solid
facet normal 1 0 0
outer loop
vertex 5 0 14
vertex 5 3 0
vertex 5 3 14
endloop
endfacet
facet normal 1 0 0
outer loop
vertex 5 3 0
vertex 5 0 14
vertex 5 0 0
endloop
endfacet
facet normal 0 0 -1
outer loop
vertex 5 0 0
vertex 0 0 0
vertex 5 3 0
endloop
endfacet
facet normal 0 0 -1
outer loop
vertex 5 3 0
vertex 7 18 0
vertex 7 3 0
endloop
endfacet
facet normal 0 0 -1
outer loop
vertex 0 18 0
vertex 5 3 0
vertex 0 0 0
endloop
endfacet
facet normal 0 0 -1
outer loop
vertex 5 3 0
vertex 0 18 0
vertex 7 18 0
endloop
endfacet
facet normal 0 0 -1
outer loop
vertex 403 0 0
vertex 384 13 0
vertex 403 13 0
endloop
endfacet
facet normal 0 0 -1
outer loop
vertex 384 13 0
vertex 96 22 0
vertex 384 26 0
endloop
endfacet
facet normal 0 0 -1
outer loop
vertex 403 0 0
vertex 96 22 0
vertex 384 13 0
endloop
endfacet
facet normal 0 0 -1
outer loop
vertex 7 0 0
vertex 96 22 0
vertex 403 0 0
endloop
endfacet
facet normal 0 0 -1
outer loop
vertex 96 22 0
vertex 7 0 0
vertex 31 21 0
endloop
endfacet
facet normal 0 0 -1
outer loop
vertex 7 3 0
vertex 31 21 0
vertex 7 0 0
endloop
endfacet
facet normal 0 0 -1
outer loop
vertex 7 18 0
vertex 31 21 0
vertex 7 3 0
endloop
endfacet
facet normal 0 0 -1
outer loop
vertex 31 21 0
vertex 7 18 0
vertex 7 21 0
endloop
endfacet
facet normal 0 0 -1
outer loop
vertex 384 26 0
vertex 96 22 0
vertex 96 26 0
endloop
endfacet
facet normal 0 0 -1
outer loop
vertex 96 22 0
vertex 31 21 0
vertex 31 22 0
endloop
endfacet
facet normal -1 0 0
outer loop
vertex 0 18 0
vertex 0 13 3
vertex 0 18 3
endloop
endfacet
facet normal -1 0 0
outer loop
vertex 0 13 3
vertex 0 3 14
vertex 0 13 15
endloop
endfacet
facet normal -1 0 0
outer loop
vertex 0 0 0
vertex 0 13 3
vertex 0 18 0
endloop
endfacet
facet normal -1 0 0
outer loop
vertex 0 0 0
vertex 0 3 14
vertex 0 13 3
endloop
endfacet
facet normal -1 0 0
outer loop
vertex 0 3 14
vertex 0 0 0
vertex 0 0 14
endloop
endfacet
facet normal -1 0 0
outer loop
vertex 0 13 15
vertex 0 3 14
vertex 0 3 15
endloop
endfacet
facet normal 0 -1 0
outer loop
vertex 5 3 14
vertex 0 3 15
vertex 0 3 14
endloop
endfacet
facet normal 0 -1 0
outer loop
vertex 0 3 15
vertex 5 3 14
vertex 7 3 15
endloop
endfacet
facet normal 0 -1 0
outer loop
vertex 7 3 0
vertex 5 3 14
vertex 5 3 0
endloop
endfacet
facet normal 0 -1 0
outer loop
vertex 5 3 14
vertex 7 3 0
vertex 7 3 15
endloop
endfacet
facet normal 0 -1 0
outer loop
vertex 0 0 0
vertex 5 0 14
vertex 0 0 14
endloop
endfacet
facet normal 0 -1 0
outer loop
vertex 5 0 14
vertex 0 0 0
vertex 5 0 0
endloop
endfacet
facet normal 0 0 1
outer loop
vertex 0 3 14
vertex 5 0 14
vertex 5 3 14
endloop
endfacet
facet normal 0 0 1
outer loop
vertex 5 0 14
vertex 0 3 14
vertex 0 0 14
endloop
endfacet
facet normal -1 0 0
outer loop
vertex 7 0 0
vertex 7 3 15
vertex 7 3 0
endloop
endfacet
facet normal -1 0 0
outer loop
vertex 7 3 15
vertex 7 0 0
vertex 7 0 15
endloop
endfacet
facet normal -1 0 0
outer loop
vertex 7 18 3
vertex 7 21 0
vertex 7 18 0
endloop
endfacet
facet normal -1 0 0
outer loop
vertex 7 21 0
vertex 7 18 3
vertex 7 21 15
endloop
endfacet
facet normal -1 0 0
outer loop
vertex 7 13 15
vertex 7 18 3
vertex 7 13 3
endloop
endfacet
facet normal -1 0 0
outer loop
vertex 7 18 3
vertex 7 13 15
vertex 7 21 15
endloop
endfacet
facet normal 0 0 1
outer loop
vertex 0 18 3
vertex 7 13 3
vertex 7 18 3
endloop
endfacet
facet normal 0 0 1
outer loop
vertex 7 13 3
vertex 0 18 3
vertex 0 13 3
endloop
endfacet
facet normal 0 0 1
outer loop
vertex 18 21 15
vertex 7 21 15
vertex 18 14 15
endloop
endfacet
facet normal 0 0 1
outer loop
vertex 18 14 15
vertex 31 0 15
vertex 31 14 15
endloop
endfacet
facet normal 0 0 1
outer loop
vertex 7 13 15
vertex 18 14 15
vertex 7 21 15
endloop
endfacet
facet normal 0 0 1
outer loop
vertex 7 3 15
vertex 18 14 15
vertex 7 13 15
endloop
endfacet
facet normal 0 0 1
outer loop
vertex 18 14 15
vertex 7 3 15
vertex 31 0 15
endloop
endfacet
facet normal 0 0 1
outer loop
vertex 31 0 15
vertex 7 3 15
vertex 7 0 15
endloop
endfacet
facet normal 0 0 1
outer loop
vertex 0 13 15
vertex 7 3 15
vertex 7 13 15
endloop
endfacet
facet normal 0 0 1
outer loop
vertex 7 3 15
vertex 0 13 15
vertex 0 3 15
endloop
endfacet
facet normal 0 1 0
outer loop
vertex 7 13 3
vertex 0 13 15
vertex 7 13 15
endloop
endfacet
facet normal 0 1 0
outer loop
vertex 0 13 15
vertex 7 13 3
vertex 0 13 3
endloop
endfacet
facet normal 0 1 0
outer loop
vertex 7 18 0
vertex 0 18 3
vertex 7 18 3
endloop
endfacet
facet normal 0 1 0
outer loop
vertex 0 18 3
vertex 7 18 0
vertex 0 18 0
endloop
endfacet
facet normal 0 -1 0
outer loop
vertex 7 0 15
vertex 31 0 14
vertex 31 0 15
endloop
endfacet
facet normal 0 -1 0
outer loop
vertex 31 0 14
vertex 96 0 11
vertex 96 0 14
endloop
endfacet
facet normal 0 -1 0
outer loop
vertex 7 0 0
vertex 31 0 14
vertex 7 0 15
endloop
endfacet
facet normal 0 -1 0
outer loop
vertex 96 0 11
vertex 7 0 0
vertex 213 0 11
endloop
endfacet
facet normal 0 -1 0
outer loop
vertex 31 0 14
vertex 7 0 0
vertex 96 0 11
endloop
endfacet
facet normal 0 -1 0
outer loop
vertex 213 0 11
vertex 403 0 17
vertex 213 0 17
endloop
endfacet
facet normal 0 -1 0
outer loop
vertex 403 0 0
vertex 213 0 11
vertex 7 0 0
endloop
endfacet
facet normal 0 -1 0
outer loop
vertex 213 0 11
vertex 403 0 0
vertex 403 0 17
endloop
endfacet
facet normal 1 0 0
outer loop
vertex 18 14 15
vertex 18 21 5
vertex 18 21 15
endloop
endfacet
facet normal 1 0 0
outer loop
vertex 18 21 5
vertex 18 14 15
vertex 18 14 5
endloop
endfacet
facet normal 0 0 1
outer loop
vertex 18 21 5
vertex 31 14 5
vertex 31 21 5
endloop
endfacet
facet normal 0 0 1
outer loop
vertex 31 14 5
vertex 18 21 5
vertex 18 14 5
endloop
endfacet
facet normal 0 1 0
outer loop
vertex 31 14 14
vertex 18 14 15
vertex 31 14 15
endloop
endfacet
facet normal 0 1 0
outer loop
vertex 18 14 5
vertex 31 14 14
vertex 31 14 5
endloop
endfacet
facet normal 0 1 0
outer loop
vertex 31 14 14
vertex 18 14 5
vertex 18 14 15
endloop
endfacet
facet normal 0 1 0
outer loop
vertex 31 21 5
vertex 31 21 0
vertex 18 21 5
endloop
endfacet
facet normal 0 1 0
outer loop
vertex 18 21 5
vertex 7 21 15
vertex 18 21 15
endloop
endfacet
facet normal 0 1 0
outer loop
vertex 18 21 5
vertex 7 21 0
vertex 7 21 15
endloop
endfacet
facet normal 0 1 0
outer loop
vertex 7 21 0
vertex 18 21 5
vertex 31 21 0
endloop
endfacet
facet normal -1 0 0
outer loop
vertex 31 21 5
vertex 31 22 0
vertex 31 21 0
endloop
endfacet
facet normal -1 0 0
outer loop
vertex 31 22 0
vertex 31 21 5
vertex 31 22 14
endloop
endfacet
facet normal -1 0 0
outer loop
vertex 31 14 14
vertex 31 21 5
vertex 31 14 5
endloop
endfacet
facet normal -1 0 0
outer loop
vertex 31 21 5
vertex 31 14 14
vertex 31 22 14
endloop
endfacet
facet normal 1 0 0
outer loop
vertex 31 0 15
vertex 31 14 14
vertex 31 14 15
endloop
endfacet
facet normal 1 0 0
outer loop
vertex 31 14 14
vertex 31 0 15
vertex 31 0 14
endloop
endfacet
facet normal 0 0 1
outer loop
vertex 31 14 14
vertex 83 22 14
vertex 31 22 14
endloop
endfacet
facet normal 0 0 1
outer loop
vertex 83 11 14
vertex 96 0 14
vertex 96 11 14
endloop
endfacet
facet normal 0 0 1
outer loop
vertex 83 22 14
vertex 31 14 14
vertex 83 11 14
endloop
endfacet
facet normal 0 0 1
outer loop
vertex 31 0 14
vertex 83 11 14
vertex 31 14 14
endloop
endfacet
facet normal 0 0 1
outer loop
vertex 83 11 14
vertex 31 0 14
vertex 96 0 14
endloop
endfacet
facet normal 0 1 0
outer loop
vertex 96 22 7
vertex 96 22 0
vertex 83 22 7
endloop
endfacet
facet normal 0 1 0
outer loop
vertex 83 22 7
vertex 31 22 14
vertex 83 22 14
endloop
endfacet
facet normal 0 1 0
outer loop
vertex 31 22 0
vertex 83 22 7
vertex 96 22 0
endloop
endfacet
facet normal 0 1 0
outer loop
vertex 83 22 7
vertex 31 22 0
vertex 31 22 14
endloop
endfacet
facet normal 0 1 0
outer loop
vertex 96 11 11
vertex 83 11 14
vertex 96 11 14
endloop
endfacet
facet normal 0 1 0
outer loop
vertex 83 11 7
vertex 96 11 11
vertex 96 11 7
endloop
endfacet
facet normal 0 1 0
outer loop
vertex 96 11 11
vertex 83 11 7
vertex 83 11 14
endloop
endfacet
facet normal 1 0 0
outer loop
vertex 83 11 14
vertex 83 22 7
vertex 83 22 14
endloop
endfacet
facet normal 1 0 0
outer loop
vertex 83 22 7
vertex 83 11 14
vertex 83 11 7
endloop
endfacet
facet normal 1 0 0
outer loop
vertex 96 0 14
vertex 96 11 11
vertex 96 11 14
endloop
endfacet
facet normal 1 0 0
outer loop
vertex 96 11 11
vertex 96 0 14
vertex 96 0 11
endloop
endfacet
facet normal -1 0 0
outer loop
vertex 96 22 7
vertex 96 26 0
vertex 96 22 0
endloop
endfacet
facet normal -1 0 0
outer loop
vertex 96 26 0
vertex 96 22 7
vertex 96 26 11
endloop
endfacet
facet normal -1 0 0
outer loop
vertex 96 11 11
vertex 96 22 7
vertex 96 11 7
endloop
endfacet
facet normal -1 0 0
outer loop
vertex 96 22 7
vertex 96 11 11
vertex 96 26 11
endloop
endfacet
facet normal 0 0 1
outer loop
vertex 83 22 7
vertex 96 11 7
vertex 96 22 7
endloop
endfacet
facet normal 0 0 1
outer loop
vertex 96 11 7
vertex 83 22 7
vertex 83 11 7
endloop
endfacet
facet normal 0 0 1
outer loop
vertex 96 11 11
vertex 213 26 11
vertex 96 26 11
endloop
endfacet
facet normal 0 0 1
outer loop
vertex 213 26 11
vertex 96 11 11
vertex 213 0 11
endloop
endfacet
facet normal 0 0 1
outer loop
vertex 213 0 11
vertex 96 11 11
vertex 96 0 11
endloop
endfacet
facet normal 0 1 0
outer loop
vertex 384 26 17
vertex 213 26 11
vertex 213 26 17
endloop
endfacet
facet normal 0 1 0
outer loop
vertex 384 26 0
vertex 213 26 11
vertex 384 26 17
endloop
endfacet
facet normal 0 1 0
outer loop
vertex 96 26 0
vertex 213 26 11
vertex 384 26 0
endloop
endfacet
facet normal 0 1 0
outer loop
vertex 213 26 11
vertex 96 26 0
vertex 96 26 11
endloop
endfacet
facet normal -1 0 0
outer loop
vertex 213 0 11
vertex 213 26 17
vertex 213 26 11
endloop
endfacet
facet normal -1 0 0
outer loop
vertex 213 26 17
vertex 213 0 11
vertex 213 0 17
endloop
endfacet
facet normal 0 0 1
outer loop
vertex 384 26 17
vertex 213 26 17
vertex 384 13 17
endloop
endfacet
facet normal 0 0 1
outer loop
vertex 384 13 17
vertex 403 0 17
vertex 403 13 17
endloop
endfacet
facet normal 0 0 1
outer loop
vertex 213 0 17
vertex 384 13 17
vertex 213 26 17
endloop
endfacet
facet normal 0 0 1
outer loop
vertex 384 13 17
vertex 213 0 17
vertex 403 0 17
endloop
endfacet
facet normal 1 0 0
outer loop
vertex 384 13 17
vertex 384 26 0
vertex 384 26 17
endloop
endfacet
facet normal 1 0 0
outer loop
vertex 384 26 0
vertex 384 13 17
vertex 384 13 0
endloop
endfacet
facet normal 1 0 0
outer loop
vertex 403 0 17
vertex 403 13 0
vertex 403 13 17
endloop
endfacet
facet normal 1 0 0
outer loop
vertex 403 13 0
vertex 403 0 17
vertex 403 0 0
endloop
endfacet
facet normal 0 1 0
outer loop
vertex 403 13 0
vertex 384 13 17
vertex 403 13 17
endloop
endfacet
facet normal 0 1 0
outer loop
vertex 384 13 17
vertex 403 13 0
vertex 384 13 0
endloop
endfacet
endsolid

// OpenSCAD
translate([2.5, 1.5, 1.0]) color([0.14748951348813844, 0.8666090764559645, 0.5114920143771782]) cube([5, 3, 2], center=true);
translate([2.5, 1.5, 3.0]) color([0.16291179601388028, 0.8928293074217152, 0.9106207302279238]) cube([5, 3, 2], center=true);
translate([2.5, 1.5, 5.0]) color([0.7053130391381187, 0.7162737307255599, 0.7235742512845528]) cube([5, 3, 2], center=true);
translate([2.5, 1.5, 7.0]) color([0.7298089625221481, 0.5196081403156461, 0.823493134639761]) cube([5, 3, 2], center=true);
translate([2.5, 1.5, 9.0]) color([0.6911885197769689, 0.6973164426626367, 0.38726457915960755]) cube([5, 3, 2], center=true);
translate([2.5, 1.5, 11.0]) color([0.18022138882203653, 0.8001465394041192, 0.8129994204848935]) cube([5, 3, 2], center=true);
translate([2.5, 1.5, 13.0]) color([0.08072942167368968, 0.17442535469903642, 0.26558344961408153]) cube([5, 3, 2], center=true);
translate([3.5, 5.5, 1.5]) color([0.8002006207478382, 0.3279381595582189, 0.7086727191051987]) cube([7, 5, 3], center=true);
translate([3.5, 5.5, 4.5]) color([0.7823295314553788, 0.5174360046946651, 0.45647885649310815]) cube([7, 5, 3], center=true);
translate([3.5, 5.5, 7.5]) color([0.9099967640280606, 0.7566722996545016, 0.44882496858184395]) cube([7, 5, 3], center=true);
translate([3.5, 5.5, 10.5]) color([0.15281911968142636, 0.6325441046469116, 0.1769660088535372]) cube([7, 5, 3], center=true);
translate([3.5, 5.5, 13.5]) color([0.5122224095001495, 0.8959696721858674, 0.31608020378500323]) cube([7, 5, 3], center=true);
translate([3.5, 10.5, 1.5]) color([0.9467436825606468, 0.1928870204716916, 0.7910187054913302]) cube([7, 5, 3], center=true);
translate([3.5, 10.5, 4.5]) color([0.6108926701450443, 0.8122678209742187, 0.5222627979471512]) cube([7, 5, 3], center=true);
translate([3.5, 10.5, 7.5]) color([0.7095307583634994, 0.9126687247694082, 0.13487625477079712]) cube([7, 5, 3], center=true);
translate([3.5, 10.5, 10.5]) color([0.7715208720856912, 0.05716454642595936, 0.08241654053773162]) cube([7, 5, 3], center=true);
translate([3.5, 10.5, 13.5]) color([0.5176706786705761, 0.0024604932439482585, 0.774865046739482]) cube([7, 5, 3], center=true);
translate([3.5, 15.5, 1.5]) color([0.10398133417765076, 0.6075408633971222, 0.5702741924791085]) cube([7, 5, 3], center=true);
translate([12.5, 3.5, 2.5]) color([0.335807396721168, 0.3780654483467295, 0.36205489178930694]) cube([11, 7, 5], center=true);
translate([12.5, 3.5, 7.5]) color([0.8413126085807436, 0.6365683683667089, 0.13610848275491239]) cube([11, 7, 5], center=true);
translate([12.5, 3.5, 12.5]) color([0.9255182446742467, 0.18259927432055334, 0.12509989752770068]) cube([11, 7, 5], center=true);
translate([12.5, 10.5, 2.5]) color([0.33788945440902196, 0.607477949510089, 0.04413950751599882]) cube([11, 7, 5], center=true);
translate([12.5, 10.5, 7.5]) color([0.6453929548117466, 0.6988419541065013, 0.7967664255910738]) cube([11, 7, 5], center=true);
translate([12.5, 10.5, 12.5]) color([0.9116718921976609, 0.600448770579328, 0.7944487907838055]) cube([11, 7, 5], center=true);
translate([12.5, 17.5, 2.5]) color([0.1681613799771936, 0.9183995562433641, 0.9268586566852167]) cube([11, 7, 5], center=true);
translate([12.5, 17.5, 7.5]) color([0.40822611044352053, 0.4407066729290805, 0.6041418306666712]) cube([11, 7, 5], center=true);
translate([12.5, 17.5, 12.5]) color([0.6201352905963935, 0.25582819932935885, 0.3097428572381714]) cube([11, 7, 5], center=true);
translate([24.5, 3.5, 2.5]) color([0.8490920052212889, 0.453637908490201, 0.18066627555108494]) cube([13, 7, 5], center=true);
translate([24.5, 3.5, 7.5]) color([0.4537290543496928, 0.2641493990309046, 0.9492851375614021]) cube([13, 7, 5], center=true);
translate([24.5, 3.5, 12.5]) color([0.06409274308092405, 0.09630522223834415, 0.02618666999626429]) cube([13, 7, 5], center=true);
translate([24.5, 10.5, 2.5]) color([0.02133712304448243, 0.40376331371079255, 0.6905719463038024]) cube([13, 7, 5], center=true);
translate([24.5, 10.5, 7.5]) color([0.8969992176715027, 0.32280326974746465, 0.790755737975632]) cube([13, 7, 5], center=true);
translate([24.5, 10.5, 12.5]) color([0.7460115169857665, 0.6948475129606672, 0.47653257906772517]) cube([13, 7, 5], center=true);
translate([24.5, 17.5, 2.5]) color([0.8579766307154586, 0.5356136848189613, 0.4019331618452773]) cube([13, 7, 5], center=true);
translate([37.5, 5.5, 3.5]) color([0.783713898498177, 0.9254696984756191, 0.0277966234683793]) cube([13, 11, 7], center=true);
translate([37.5, 5.5, 10.5]) color([0.5158650286176655, 0.8365998776746773, 0.08009244005093674]) cube([13, 11, 7], center=true);
translate([37.5, 16.5, 3.5]) color([0.35854963179787425, 0.0984859129144442, 0.9681463616569913]) cube([13, 11, 7], center=true);
translate([37.5, 16.5, 10.5]) color([0.1542718478221884, 0.5165971564168642, 0.8047430089643692]) cube([13, 11, 7], center=true);
translate([50.5, 5.5, 3.5]) color([0.9598305824160865, 0.0007265089205383823, 0.33769105491683293]) cube([13, 11, 7], center=true);
translate([50.5, 5.5, 10.5]) color([0.9444140087685011, 0.6959768172121321, 0.16055826227824588]) cube([13, 11, 7], center=true);
translate([50.5, 16.5, 3.5]) color([0.7793255516951493, 0.1589752259859445, 0.6798370424105331]) cube([13, 11, 7], center=true);
translate([50.5, 16.5, 10.5]) color([0.9431536263145228, 0.9341404857092784, 0.32827049453258017]) cube([13, 11, 7], center=true);
translate([63.5, 5.5, 3.5]) color([0.023848105094706917, 0.9585798448912861, 0.6258377632382796]) cube([13, 11, 7], center=true);
translate([63.5, 5.5, 10.5]) color([0.3981042954636257, 0.2264255750200933, 0.6356717667101055]) cube([13, 11, 7], center=true);
translate([63.5, 16.5, 3.5]) color([0.328569085672622, 0.9662245753272395, 0.3520821722301851]) cube([13, 11, 7], center=true);
translate([63.5, 16.5, 10.5]) color([0.16362135021644642, 0.42074777530803376, 0.36328644213461747]) cube([13, 11, 7], center=true);
translate([76.5, 5.5, 3.5]) color([0.5653807754665455, 0.3865100485452896, 0.7707594112565195]) cube([13, 11, 7], center=true);
translate([76.5, 5.5, 10.5]) color([0.16214085318372695, 0.5836514905515098, 0.6869400768720183]) cube([13, 11, 7], center=true);
translate([76.5, 16.5, 3.5]) color([0.718467099976435, 0.17196229100139104, 0.14887881293527583]) cube([13, 11, 7], center=true);
translate([76.5, 16.5, 10.5]) color([0.025166107893626943, 0.32332346968418324, 0.003696799562737496]) cube([13, 11, 7], center=true);
translate([89.5, 5.5, 3.5]) color([0.04720529747843194, 0.9255571895234466, 0.573001262631075]) cube([13, 11, 7], center=true);
translate([89.5, 5.5, 10.5]) color([0.14769469781462263, 0.15315209085934545, 0.7868491215994531]) cube([13, 11, 7], center=true);
translate([89.5, 16.5, 3.5]) color([0.7877029182496789, 0.4187372508366701, 0.5680438273675328]) cube([13, 11, 7], center=true);
translate([102.5, 6.5, 5.5]) color([0.6864311496386182, 0.7112052310106062, 0.9225367392437966]) cube([13, 13, 11], center=true);
translate([102.5, 19.5, 5.5]) color([0.36402675889620517, 0.21666285047939615, 0.40038769746607716]) cube([13, 13, 11], center=true);
translate([115.5, 6.5, 5.5]) color([0.12979762559949215, 0.5661089096865166, 0.350592866287013]) cube([13, 13, 11], center=true);
translate([115.5, 19.5, 5.5]) color([0.09655676358596321, 0.8957043173613797, 0.24564542972396286]) cube([13, 13, 11], center=true);
translate([128.5, 6.5, 5.5]) color([0.3817592950540295, 0.9163373365613642, 0.24005472395766314]) cube([13, 13, 11], center=true);
translate([128.5, 19.5, 5.5]) color([0.4811830401201487, 0.9204180358452778, 0.06901768472479497]) cube([13, 13, 11], center=true);
translate([141.5, 6.5, 5.5]) color([0.25236871091997304, 0.2758752397078251, 0.526585946767007]) cube([13, 13, 11], center=true);
translate([141.5, 19.5, 5.5]) color([0.5423400552699501, 0.6040332809955223, 0.7795947303962014]) cube([13, 13, 11], center=true);
translate([154.5, 6.5, 5.5]) color([0.8767515811101877, 0.27628184885013174, 0.6109665581700968]) cube([13, 13, 11], center=true);
translate([154.5, 19.5, 5.5]) color([0.8673330381368943, 0.39077563557117434, 0.6261021875341246]) cube([13, 13, 11], center=true);
translate([167.5, 6.5, 5.5]) color([0.5344719952169016, 0.8525626141482417, 0.1442072370162294]) cube([13, 13, 11], center=true);
translate([167.5, 19.5, 5.5]) color([0.39242938925918713, 0.7677442686337953, 0.7310024639236243]) cube([13, 13, 11], center=true);
translate([180.5, 6.5, 5.5]) color([0.976490023680837, 0.432956620488795, 0.10481875176128097]) cube([13, 13, 11], center=true);
translate([180.5, 19.5, 5.5]) color([0.4606863677813431, 0.461987586031698, 0.16960878923904732]) cube([13, 13, 11], center=true);
translate([193.5, 6.5, 5.5]) color([0.4743590683571708, 0.15900931947085895, 0.9184122383299332]) cube([13, 13, 11], center=true);
translate([193.5, 19.5, 5.5]) color([0.8645912802495788, 0.7618309073415613, 0.1125156501937501]) cube([13, 13, 11], center=true);
translate([206.5, 6.5, 5.5]) color([0.36828247715101237, 0.14269334546182144, 0.3576212954978014]) cube([13, 13, 11], center=true);
translate([206.5, 19.5, 5.5]) color([0.47267833076618404, 0.5187172796832821, 0.05390524264941354]) cube([13, 13, 11], center=true);
translate([222.5, 6.5, 8.5]) color([0.8771386739413267, 0.25763233882857706, 0.7234564765071956]) cube([19, 13, 17], center=true);
translate([222.5, 19.5, 8.5]) color([0.3246711887124375, 0.3801134723009394, 0.04146251299314507]) cube([19, 13, 17], center=true);
translate([241.5, 6.5, 8.5]) color([0.5514350789130729, 0.03490092368589748, 0.4105469306488987]) cube([19, 13, 17], center=true);
translate([241.5, 19.5, 8.5]) color([0.3751623833766272, 0.20817480494735885, 0.13416269520041413]) cube([19, 13, 17], center=true);
translate([260.5, 6.5, 8.5]) color([0.11029894361740877, 0.3569637027811857, 0.03122581862343432]) cube([19, 13, 17], center=true);
translate([260.5, 19.5, 8.5]) color([0.5766961902260587, 0.46351932045943167, 0.6418946885374921]) cube([19, 13, 17], center=true);
translate([279.5, 6.5, 8.5]) color([0.7070356211127606, 0.07782501561786981, 0.42542790282452947]) cube([19, 13, 17], center=true);
translate([279.5, 19.5, 8.5]) color([0.7262099352025745, 0.1383007479401901, 0.15296819960671582]) cube([19, 13, 17], center=true);
translate([298.5, 6.5, 8.5]) color([0.16447153857536234, 0.02972250823157674, 0.13555611535148748]) cube([19, 13, 17], center=true);
translate([298.5, 19.5, 8.5]) color([0.49304209170471214, 0.8998582652350663, 0.6233506257524957]) cube([19, 13, 17], center=true);
translate([317.5, 6.5, 8.5]) color([0.28803948846792526, 0.7932252536354372, 0.6841926136499455]) cube([19, 13, 17], center=true);
translate([317.5, 19.5, 8.5]) color([0.8025617596714979, 0.9141286153689818, 0.8380916000073253]) cube([19, 13, 17], center=true);
translate([336.5, 6.5, 8.5]) color([0.7734206085146829, 0.26176851167691584, 0.15831969188506612]) cube([19, 13, 17], center=true);
translate([336.5, 19.5, 8.5]) color([0.6279762350139132, 0.968532274155243, 0.5331314108905011]) cube([19, 13, 17], center=true);
translate([355.5, 6.5, 8.5]) color([0.14458049768334114, 0.3761389701406963, 0.7397992144806613]) cube([19, 13, 17], center=true);
translate([355.5, 19.5, 8.5]) color([0.5554788507911738, 0.2345364606417215, 0.9148239194796951]) cube([19, 13, 17], center=true);
translate([374.5, 6.5, 8.5]) color([0.37856658806298793, 0.39026506951982043, 0.4712732695903361]) cube([19, 13, 17], center=true);
translate([374.5, 19.5, 8.5]) color([0.3061585200178283, 0.41010119017851343, 0.4062986061941243]) cube([19, 13, 17], center=true);
translate([393.5, 6.5, 8.5]) color([0.09771277519641097, 0.9732189413459187, 0.1476462111243403]) cube([19, 13, 17], center=true);
